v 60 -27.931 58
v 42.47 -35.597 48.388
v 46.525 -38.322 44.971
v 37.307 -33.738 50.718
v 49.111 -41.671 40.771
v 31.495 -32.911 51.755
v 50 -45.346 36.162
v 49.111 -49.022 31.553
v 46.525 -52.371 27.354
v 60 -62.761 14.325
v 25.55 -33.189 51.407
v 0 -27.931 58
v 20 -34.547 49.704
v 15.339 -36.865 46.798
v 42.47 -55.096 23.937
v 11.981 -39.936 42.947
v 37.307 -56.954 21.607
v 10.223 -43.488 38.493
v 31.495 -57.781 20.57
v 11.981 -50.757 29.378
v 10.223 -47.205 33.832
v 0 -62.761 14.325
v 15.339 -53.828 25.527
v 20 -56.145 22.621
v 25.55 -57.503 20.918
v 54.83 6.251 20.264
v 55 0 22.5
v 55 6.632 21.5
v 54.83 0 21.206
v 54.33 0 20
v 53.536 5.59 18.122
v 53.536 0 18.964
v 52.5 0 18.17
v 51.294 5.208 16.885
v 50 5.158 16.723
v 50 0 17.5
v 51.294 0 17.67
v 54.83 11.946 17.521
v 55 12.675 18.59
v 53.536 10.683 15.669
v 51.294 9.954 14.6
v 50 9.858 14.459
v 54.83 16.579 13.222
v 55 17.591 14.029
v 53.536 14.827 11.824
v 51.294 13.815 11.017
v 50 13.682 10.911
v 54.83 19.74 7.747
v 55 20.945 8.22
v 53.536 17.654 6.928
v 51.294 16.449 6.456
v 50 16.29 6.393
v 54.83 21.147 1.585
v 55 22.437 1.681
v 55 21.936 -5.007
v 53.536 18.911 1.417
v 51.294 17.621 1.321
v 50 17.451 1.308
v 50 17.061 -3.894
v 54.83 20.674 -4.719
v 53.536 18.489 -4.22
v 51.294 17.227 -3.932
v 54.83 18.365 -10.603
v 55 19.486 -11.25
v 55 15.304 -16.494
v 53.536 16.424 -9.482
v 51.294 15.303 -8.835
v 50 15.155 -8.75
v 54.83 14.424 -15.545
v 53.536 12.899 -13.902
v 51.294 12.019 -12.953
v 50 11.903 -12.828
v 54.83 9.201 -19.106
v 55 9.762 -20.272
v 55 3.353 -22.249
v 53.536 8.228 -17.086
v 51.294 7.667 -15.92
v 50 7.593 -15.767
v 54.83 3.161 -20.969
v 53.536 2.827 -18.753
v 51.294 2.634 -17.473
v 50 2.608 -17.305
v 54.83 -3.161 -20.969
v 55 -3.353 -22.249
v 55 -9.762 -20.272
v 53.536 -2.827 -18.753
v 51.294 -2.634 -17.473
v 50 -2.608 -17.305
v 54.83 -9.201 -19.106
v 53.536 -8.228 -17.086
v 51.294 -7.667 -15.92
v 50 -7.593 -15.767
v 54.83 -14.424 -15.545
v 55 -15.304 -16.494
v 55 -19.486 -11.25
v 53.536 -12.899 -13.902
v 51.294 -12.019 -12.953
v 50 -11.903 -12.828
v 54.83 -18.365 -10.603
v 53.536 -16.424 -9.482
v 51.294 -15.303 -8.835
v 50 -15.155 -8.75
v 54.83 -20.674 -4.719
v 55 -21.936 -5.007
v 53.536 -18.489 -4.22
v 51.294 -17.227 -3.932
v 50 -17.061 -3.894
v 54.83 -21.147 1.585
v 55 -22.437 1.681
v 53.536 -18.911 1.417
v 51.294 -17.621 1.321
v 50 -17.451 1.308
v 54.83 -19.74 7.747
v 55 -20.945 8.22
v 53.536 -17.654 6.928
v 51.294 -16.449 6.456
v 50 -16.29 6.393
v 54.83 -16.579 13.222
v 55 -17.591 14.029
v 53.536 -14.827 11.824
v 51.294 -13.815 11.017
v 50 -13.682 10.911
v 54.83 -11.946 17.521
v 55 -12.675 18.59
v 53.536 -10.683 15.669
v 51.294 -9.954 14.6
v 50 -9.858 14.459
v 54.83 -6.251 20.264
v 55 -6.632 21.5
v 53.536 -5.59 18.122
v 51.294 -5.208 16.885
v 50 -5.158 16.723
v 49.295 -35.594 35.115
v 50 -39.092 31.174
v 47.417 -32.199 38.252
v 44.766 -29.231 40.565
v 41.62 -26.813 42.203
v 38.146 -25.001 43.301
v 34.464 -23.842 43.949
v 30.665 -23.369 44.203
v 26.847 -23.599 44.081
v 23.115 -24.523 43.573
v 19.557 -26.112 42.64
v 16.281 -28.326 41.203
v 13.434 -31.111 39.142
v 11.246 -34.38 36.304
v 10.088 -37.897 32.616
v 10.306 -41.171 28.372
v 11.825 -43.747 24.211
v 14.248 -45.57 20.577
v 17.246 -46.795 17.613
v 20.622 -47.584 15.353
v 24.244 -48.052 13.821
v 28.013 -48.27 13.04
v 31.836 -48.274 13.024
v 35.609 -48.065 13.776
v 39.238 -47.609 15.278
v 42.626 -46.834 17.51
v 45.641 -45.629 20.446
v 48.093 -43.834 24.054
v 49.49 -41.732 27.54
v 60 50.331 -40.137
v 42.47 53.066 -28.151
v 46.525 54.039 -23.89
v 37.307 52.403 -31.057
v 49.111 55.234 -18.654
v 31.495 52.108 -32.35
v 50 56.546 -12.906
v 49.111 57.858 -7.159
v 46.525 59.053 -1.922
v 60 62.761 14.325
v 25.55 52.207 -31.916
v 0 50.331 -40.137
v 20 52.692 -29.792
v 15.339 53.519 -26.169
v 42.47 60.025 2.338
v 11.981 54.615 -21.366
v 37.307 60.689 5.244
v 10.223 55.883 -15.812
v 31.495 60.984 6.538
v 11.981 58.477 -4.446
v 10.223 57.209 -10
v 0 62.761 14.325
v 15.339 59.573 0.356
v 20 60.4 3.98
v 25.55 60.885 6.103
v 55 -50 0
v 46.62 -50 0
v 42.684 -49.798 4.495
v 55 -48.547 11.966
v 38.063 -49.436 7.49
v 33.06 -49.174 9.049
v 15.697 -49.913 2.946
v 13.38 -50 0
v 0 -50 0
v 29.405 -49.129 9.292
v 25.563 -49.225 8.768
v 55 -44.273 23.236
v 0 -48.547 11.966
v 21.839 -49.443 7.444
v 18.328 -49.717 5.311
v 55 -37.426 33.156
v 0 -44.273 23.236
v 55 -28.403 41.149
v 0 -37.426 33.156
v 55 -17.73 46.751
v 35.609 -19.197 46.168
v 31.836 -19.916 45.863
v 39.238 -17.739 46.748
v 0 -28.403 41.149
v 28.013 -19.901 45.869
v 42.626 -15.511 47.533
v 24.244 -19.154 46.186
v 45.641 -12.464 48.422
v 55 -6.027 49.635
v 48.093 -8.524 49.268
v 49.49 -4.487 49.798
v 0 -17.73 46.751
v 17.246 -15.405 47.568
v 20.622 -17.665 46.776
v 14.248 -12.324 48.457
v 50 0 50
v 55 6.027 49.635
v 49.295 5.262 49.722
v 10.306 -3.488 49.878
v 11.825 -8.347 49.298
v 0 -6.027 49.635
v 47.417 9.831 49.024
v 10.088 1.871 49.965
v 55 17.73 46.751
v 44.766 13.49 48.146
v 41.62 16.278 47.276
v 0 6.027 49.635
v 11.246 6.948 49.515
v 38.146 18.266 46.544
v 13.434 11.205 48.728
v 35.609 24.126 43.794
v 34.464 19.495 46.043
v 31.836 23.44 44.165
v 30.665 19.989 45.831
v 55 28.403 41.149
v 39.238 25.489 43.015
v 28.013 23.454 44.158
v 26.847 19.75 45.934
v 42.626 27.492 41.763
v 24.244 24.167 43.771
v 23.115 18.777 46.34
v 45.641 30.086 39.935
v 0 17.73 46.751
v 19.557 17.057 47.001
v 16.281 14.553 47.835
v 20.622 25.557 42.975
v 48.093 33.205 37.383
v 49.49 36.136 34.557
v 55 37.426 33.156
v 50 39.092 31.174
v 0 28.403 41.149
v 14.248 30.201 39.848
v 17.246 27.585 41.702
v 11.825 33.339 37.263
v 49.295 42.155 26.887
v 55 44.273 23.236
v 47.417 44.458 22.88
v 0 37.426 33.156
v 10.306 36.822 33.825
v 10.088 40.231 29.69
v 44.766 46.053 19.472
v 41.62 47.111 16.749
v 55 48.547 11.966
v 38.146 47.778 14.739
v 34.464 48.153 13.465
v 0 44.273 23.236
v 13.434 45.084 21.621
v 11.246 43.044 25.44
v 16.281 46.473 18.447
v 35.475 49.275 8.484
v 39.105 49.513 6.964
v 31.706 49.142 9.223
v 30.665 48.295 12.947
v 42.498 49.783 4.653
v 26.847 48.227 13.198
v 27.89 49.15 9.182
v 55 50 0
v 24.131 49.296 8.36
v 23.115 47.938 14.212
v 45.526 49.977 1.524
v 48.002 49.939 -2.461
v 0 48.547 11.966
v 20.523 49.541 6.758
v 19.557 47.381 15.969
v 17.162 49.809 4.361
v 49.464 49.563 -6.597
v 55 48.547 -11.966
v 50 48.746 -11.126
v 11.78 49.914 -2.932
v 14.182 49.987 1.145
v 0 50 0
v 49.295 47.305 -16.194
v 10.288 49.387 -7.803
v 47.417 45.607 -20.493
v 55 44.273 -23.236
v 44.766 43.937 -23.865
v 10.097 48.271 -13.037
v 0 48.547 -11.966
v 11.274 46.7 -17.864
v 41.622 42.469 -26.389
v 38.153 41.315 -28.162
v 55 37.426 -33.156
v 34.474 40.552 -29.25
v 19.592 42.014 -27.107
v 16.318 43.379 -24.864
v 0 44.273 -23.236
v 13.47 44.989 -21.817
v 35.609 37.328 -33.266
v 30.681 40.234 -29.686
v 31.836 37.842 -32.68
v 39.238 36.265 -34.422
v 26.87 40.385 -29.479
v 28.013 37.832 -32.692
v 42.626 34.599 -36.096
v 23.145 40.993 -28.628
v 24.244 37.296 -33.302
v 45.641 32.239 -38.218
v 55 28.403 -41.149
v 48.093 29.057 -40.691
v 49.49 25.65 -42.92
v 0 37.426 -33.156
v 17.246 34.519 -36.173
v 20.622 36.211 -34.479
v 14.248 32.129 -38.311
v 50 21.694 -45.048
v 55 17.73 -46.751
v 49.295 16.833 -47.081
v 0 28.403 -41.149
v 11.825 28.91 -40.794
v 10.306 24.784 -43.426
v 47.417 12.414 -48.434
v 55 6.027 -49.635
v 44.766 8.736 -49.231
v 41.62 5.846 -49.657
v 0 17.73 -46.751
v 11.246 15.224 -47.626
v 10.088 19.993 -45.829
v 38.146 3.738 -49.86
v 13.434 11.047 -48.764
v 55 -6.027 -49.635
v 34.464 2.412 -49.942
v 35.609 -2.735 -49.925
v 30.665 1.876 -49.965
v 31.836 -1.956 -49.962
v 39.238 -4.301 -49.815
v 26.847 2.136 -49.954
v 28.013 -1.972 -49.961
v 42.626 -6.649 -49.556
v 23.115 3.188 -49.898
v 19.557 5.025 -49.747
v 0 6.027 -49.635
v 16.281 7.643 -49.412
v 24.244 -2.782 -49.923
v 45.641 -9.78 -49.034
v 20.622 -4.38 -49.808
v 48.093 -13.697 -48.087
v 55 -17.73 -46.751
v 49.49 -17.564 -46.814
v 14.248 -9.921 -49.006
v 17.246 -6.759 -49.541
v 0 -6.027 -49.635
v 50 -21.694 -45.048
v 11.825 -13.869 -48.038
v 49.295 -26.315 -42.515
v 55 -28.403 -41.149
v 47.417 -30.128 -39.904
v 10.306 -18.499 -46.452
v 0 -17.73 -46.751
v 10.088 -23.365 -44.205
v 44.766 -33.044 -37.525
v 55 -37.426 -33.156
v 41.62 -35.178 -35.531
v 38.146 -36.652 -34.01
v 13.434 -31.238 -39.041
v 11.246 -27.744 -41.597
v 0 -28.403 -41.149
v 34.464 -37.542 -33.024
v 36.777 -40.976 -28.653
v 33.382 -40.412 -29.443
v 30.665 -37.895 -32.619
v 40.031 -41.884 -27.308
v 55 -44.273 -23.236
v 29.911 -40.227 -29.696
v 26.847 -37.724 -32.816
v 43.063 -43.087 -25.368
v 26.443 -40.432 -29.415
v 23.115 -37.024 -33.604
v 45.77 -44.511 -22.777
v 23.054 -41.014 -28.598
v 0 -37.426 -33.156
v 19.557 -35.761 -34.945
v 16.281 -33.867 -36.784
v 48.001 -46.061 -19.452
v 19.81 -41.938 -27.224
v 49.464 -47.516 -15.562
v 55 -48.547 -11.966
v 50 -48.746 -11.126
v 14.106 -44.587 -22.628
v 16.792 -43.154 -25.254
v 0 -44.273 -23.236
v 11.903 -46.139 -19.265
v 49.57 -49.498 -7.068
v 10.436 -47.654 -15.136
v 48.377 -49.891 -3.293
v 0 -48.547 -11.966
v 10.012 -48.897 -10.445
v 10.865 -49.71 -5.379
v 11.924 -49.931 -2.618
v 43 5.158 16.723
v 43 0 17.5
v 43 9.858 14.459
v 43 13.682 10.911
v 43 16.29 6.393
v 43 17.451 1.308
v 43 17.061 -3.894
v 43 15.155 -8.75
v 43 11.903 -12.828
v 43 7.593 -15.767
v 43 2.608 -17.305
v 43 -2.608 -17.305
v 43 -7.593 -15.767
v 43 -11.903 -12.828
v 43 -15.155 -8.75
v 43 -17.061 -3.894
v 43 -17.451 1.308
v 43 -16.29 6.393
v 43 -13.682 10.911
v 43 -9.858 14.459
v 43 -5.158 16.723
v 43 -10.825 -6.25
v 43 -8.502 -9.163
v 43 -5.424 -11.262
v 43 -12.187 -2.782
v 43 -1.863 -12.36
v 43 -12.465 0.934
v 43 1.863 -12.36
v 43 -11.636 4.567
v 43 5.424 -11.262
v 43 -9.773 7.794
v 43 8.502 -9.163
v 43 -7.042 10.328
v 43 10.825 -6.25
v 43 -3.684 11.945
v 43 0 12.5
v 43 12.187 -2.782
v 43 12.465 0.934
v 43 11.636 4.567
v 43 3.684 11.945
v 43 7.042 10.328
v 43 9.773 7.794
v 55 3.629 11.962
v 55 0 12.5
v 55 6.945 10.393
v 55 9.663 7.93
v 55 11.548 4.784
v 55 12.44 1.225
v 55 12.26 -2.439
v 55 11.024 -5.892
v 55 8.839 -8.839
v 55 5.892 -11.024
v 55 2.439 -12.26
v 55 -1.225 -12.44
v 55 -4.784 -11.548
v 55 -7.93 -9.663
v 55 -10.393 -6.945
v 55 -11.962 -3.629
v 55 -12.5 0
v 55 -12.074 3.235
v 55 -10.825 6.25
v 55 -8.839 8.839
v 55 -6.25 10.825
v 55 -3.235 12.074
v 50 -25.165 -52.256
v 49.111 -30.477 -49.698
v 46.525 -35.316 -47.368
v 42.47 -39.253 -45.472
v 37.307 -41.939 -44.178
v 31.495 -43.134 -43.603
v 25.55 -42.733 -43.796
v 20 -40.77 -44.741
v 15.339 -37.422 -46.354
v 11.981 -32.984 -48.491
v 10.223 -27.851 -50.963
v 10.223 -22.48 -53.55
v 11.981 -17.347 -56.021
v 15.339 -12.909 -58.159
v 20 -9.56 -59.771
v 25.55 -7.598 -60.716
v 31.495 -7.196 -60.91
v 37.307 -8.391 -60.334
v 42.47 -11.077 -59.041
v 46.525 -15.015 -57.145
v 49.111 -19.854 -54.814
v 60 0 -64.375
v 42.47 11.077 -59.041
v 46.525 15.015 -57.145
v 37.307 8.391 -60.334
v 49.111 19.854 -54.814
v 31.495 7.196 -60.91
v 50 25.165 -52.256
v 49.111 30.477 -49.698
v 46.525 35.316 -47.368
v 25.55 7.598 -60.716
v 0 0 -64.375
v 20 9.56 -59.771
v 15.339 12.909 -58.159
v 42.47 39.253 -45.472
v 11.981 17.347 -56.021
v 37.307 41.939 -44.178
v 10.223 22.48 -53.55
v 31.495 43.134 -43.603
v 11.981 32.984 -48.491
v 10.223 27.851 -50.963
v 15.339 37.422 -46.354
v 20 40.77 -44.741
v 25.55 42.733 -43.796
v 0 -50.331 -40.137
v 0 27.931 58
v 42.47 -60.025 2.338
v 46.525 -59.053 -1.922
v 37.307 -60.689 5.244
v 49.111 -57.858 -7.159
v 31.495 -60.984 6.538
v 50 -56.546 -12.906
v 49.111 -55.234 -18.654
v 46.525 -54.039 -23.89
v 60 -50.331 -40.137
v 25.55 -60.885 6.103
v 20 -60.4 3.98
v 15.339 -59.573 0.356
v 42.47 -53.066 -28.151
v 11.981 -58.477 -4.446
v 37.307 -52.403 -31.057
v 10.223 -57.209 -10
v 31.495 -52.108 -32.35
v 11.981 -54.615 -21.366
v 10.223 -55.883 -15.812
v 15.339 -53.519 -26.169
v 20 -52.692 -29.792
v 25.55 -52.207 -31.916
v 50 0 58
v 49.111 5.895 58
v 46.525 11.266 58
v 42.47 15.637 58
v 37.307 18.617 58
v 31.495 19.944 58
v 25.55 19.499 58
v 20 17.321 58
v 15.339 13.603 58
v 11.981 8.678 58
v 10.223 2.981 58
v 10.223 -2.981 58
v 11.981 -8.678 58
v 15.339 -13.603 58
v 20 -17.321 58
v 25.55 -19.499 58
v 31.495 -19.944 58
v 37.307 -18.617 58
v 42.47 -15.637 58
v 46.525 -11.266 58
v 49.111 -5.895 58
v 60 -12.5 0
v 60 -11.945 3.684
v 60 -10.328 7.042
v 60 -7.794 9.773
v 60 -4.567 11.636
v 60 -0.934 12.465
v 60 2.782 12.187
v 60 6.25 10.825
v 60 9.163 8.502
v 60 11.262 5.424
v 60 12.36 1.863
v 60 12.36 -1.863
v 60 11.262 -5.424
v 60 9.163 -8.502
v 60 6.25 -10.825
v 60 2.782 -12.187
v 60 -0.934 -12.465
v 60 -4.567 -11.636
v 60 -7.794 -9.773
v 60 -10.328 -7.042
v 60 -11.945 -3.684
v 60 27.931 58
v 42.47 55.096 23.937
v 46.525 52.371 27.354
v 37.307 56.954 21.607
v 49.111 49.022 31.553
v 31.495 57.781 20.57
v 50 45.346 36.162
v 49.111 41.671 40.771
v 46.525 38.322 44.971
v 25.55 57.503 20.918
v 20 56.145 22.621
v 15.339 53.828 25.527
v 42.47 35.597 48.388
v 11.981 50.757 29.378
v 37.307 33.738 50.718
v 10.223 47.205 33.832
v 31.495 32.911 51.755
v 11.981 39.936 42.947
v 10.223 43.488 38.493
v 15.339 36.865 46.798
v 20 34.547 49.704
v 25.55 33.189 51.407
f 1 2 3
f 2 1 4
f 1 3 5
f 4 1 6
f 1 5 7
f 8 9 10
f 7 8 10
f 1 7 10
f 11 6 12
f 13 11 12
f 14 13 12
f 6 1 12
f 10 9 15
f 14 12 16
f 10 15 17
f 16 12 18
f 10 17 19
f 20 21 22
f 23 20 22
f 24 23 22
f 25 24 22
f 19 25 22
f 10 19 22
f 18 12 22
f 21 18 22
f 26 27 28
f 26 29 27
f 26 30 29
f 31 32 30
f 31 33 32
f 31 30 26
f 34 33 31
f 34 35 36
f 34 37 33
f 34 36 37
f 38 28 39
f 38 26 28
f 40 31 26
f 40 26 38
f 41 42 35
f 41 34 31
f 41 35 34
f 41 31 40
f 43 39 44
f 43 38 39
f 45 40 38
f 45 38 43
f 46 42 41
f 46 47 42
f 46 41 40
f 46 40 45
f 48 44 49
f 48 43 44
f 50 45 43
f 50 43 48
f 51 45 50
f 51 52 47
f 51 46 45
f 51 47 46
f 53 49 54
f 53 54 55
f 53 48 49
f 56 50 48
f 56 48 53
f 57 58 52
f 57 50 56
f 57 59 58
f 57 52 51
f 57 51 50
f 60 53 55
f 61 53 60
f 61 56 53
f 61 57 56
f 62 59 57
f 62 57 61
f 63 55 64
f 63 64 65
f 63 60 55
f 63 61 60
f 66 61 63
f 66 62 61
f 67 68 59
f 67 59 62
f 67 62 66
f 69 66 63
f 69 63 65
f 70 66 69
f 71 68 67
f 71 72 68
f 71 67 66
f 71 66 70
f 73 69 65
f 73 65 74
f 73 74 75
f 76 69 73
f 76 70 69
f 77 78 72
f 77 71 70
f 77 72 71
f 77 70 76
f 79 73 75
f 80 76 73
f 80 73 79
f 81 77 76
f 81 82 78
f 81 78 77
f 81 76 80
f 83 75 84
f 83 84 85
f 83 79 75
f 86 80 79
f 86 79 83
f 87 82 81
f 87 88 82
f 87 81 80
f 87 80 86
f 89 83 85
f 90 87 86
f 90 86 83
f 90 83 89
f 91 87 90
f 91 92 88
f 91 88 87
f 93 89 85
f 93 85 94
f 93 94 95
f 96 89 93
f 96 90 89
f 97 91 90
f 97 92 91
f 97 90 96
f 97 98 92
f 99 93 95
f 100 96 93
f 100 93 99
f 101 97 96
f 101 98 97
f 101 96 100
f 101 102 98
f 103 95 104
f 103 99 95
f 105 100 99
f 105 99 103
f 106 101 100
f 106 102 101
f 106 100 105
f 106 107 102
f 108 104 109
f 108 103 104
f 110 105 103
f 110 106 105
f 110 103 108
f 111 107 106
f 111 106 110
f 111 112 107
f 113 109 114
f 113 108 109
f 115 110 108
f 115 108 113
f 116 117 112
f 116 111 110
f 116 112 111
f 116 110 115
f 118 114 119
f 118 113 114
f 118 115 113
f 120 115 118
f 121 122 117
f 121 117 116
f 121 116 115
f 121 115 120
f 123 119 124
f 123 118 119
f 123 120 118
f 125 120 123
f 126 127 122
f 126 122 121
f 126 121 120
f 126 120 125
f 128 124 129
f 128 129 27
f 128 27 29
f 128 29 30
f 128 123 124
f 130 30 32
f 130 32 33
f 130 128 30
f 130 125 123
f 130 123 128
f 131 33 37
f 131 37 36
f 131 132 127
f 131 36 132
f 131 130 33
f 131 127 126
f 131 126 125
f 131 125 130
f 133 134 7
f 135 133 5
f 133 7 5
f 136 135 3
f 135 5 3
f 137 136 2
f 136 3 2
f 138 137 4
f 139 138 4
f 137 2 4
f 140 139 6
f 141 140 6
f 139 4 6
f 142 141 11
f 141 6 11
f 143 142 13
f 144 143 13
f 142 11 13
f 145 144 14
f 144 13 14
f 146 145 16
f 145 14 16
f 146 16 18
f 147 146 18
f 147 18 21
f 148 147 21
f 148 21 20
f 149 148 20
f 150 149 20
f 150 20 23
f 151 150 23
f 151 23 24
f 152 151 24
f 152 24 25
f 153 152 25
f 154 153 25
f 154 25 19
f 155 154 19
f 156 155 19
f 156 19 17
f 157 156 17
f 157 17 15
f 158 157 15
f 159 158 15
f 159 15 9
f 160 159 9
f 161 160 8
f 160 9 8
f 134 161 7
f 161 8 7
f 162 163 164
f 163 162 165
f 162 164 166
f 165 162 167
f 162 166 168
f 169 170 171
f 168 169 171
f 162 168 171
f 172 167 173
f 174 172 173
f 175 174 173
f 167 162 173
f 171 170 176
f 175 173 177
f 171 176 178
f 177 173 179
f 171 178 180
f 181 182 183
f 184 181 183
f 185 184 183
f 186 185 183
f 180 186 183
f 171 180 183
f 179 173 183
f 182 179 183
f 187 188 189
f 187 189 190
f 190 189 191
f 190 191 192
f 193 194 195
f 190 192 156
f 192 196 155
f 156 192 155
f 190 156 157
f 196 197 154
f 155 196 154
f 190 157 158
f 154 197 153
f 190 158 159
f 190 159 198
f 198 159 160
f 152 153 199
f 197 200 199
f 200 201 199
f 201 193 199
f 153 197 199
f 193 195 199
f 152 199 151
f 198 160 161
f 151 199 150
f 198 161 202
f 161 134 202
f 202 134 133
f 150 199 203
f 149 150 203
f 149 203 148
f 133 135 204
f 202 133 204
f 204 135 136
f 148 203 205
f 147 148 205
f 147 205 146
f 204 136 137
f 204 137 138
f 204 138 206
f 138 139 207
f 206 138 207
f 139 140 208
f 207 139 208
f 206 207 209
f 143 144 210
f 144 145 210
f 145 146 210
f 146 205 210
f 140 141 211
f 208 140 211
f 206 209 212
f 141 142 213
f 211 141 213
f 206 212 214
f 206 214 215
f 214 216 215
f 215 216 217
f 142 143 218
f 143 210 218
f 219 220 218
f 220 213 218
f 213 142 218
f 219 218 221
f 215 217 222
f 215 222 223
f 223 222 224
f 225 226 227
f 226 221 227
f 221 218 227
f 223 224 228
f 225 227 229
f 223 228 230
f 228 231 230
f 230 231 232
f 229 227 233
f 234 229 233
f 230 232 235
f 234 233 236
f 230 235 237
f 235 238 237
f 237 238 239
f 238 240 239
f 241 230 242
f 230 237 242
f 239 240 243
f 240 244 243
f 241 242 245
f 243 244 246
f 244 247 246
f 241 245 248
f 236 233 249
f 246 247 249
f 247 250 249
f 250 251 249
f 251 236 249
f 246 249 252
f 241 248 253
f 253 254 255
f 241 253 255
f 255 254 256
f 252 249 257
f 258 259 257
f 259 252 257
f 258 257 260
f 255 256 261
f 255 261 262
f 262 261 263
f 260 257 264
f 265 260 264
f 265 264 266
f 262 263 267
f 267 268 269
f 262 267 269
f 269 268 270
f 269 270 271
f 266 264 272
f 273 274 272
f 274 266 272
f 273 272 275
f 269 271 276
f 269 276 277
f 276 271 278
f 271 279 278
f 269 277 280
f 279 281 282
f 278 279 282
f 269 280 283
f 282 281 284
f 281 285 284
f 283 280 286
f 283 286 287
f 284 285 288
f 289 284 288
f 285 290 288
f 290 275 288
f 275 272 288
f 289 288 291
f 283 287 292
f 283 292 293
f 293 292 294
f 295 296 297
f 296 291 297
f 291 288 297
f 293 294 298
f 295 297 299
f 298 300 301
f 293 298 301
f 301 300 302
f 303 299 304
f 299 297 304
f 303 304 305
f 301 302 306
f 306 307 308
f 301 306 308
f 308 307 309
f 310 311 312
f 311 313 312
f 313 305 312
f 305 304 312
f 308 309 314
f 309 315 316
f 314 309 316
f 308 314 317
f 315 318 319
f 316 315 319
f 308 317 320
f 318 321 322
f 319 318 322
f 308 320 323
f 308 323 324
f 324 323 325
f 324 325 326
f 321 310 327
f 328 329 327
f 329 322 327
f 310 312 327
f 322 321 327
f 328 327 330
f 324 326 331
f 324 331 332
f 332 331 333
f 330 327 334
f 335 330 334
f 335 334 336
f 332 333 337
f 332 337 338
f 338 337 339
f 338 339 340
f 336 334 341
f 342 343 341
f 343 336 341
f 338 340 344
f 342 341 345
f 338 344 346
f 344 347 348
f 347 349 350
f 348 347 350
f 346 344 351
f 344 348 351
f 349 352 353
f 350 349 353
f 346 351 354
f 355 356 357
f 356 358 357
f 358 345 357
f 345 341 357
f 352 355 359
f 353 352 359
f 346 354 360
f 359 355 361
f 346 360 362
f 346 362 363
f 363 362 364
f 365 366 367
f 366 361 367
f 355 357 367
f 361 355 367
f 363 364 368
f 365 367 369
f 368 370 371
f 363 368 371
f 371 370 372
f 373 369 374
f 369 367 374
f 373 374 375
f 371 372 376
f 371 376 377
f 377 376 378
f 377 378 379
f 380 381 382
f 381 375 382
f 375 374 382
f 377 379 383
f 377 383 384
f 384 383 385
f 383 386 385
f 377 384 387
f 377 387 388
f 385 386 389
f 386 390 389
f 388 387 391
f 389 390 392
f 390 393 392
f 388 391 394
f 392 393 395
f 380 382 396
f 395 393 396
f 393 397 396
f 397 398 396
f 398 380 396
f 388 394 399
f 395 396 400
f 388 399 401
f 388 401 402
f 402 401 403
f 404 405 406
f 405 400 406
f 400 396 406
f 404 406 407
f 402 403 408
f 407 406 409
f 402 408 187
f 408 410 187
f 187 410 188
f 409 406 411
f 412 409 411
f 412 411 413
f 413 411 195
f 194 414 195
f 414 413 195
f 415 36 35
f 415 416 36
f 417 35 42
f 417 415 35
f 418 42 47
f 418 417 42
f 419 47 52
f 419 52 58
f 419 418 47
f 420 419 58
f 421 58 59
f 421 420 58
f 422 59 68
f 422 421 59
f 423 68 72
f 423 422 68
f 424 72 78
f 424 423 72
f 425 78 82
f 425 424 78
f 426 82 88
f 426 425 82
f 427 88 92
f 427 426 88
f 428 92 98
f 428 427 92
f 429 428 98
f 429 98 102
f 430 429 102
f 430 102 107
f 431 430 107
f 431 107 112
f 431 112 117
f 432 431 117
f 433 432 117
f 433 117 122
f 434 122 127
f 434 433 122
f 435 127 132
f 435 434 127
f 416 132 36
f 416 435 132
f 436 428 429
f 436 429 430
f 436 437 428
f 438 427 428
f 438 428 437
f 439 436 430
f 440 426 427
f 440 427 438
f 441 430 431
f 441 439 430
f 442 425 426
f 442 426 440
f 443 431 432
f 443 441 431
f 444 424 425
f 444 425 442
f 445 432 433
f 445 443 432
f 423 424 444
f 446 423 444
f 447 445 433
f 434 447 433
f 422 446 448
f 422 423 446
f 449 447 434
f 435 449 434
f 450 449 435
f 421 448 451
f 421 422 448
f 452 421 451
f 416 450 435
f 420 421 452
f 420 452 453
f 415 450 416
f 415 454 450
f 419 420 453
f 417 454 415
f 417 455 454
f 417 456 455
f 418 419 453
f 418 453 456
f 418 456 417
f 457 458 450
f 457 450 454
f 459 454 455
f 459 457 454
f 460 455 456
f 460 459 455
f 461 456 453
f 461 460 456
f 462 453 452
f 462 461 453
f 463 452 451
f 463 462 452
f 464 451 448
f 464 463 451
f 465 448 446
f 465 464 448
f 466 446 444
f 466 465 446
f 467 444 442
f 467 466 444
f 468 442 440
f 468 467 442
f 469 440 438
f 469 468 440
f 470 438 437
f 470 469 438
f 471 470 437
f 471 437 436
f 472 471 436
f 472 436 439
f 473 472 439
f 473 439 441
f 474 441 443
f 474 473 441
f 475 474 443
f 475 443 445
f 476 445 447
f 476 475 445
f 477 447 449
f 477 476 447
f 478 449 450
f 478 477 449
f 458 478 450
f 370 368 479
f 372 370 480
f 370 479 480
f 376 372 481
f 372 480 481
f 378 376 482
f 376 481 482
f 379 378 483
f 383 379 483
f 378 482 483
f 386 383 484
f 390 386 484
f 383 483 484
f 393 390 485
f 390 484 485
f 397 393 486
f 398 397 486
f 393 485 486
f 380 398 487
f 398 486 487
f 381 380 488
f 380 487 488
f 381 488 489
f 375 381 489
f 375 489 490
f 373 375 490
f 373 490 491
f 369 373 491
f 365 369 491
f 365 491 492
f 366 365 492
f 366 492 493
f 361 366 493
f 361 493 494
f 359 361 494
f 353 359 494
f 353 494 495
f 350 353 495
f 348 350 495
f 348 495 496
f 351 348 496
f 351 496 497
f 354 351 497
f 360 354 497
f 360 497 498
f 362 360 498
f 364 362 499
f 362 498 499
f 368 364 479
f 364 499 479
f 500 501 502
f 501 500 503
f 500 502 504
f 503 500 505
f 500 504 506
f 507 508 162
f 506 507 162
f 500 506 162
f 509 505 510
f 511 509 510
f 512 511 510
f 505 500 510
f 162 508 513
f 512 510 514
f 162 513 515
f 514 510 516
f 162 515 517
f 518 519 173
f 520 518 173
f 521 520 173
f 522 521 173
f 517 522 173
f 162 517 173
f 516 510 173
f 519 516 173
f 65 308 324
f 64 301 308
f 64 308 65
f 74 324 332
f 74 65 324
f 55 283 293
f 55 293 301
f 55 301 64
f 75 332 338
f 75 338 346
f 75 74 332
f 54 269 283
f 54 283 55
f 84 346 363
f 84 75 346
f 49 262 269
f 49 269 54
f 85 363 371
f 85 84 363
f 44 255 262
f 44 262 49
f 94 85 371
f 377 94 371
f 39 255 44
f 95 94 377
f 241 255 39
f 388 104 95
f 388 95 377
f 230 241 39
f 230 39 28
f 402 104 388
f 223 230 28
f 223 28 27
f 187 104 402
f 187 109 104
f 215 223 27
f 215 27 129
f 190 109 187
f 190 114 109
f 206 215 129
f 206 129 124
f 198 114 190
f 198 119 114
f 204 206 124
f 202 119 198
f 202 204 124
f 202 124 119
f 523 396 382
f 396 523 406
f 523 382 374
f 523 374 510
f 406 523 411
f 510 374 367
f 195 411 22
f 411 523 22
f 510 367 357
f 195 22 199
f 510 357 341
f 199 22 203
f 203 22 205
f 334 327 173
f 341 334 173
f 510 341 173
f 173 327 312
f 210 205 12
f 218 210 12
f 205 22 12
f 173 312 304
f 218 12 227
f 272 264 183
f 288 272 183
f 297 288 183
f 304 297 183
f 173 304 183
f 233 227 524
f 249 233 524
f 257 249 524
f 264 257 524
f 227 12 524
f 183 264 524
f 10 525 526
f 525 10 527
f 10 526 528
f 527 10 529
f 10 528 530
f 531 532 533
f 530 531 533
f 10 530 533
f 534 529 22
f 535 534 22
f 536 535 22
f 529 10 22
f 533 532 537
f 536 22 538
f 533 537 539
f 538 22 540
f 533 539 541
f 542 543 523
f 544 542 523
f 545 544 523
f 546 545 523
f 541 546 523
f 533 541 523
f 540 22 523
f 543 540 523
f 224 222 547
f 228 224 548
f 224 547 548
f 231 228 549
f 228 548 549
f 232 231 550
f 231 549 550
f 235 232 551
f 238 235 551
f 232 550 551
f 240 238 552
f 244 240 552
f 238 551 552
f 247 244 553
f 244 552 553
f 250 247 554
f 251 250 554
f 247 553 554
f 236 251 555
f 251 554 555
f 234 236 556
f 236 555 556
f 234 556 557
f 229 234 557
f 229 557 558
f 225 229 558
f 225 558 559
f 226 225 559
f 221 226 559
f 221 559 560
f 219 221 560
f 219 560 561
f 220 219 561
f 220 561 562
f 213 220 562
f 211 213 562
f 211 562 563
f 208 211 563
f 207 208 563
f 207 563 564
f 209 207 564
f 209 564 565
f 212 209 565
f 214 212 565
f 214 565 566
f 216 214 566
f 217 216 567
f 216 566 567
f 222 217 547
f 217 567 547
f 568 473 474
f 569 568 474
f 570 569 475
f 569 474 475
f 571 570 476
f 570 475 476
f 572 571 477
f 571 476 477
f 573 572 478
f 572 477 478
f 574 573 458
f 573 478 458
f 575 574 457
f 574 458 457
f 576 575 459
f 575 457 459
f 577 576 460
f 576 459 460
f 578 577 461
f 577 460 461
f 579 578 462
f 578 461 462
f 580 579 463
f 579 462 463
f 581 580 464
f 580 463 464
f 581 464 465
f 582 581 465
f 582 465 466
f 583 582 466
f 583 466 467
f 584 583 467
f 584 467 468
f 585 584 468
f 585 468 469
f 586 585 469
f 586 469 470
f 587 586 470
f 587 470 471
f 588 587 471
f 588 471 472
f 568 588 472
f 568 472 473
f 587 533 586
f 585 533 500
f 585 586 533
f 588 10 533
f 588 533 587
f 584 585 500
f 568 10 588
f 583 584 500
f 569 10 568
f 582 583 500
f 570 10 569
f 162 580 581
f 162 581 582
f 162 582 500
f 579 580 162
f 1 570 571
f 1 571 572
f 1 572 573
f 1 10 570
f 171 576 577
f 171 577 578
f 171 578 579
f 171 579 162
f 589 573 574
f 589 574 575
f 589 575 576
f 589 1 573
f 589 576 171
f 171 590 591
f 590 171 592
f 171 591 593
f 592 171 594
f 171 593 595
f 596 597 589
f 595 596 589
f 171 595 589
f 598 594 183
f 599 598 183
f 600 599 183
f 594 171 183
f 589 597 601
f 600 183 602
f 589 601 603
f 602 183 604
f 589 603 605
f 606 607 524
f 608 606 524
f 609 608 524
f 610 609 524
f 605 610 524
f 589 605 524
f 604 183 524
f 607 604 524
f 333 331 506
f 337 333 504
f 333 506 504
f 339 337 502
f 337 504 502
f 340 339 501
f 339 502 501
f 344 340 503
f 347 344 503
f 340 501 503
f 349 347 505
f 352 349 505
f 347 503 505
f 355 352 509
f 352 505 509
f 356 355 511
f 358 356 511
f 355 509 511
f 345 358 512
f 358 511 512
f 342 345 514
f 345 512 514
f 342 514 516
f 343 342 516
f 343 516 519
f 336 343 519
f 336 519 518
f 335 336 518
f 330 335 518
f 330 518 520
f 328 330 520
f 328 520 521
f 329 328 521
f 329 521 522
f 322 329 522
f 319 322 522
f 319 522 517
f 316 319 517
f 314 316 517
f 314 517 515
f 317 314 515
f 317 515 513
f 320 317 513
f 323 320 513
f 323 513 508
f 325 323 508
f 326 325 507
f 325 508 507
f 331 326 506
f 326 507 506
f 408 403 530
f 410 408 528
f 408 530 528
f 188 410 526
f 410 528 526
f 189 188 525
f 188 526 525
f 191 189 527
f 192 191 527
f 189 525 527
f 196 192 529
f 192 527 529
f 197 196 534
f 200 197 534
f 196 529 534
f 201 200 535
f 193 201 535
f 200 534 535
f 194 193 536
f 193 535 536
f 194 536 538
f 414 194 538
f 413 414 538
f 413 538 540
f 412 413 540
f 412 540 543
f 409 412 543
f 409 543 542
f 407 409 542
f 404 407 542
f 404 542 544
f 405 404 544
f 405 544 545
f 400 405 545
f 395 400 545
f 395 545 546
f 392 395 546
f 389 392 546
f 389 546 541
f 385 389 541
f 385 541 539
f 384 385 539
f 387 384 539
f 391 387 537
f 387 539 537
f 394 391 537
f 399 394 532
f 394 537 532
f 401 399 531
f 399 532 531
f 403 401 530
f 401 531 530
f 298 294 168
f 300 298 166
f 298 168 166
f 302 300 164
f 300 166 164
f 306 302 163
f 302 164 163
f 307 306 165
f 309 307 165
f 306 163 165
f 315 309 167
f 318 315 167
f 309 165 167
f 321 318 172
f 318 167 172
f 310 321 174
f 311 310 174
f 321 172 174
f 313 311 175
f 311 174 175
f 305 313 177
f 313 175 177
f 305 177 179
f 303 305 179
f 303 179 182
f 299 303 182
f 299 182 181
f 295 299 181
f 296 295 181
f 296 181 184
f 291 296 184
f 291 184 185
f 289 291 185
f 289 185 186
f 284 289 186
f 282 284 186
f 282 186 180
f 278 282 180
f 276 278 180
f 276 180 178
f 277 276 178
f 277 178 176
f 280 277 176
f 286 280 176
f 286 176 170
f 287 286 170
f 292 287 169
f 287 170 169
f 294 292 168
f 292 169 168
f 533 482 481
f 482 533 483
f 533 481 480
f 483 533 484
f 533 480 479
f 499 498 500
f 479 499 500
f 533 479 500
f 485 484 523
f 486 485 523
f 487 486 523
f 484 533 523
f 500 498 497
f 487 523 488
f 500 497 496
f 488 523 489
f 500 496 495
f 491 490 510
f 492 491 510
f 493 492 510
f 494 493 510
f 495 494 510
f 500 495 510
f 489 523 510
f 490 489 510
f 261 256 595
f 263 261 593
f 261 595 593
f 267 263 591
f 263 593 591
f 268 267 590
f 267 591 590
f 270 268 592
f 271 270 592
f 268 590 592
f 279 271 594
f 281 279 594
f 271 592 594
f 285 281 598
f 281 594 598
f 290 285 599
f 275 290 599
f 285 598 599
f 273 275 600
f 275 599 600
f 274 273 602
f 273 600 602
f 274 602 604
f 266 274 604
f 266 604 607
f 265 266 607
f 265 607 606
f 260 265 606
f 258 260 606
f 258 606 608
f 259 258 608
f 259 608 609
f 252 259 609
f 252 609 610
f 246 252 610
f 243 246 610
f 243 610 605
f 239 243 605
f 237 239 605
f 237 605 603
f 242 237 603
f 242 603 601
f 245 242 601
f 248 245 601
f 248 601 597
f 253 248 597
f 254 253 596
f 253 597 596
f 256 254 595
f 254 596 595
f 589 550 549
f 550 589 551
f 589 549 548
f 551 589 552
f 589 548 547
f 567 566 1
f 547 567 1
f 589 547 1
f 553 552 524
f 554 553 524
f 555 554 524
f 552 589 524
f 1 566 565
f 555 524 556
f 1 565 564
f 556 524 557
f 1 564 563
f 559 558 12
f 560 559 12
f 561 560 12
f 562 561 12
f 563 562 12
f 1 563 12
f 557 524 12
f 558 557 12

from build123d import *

# Parameters (mm, degrees)
F1_DEPTH  = 60
F2_R      = 50
F3_DEPTH  = 55
F4_R      = 12.5
F5_DEPTH  = 60.001
F8_R      = 20
F9_DEPTH  = 25
F10_COUNT = 7


with BuildPart() as f1:
    # F0 (on Right) → F1 (new body)
    with BuildSketch(Plane.YZ):
        Polygon((27.9313278908, 58), (-27.9313278908, 58), (-62.7611240755, 14.3248170156), (-50.3305137376, -40.1372453545), (0, -64.3751433221), (50.3305137376, -40.1372453545), (62.7611240755, 14.3248170156), align=None)
    extrude(amount=F1_DEPTH)

    # F2 (on face) → F3 (cut)
    with BuildSketch(Plane(origin=(0, 0, 0), x_dir=(0, -1, 0), z_dir=(-1, 0, 0))):
        Circle(F2_R)
    extrude(amount=-F3_DEPTH, mode=Mode.SUBTRACT)

    # F4 (on face) → F5 (cut, through all)
    with BuildSketch(Plane(origin=(0, 0, 0), x_dir=(0, -1, 0), z_dir=(-1, 0, 0))):
        Circle(F4_R)
    extrude(amount=-F5_DEPTH, mode=Mode.SUBTRACT)

    # F6 (on Front) → F7 (revolve)
    with BuildSketch(Plane.XZ):
        with BuildLine():
            Line((43, 17.5), (43, 12.5))
            Line((43, 12.5), (55, 12.5))
            Line((55, 12.5), (55, 22.5))
            ThreePointArc((55, 22.5), (53.5355339059, 18.9644660941), (50, 17.5))
            Line((50, 17.5), (43, 17.5))
        make_face()
    revolve(axis=Axis((55, 0, 0), (-1, 0, 0)))

    # F8 (on face) → F9 (cut)
    with BuildSketch(Plane.XY.offset(58)):
        with Locations((30, 0)):
            Circle(F8_R)
    f9 = extrude(amount=-F9_DEPTH, mode=Mode.SUBTRACT)

    # F10: F9 ×7 about axis
    f10_axis = Axis((60, 0, 0), (-1, 0, 0))
    for i in range(1, F10_COUNT):
        add(f9.rotate(f10_axis, i * 360 / F10_COUNT), mode=Mode.SUBTRACT)


solid = f1.part
